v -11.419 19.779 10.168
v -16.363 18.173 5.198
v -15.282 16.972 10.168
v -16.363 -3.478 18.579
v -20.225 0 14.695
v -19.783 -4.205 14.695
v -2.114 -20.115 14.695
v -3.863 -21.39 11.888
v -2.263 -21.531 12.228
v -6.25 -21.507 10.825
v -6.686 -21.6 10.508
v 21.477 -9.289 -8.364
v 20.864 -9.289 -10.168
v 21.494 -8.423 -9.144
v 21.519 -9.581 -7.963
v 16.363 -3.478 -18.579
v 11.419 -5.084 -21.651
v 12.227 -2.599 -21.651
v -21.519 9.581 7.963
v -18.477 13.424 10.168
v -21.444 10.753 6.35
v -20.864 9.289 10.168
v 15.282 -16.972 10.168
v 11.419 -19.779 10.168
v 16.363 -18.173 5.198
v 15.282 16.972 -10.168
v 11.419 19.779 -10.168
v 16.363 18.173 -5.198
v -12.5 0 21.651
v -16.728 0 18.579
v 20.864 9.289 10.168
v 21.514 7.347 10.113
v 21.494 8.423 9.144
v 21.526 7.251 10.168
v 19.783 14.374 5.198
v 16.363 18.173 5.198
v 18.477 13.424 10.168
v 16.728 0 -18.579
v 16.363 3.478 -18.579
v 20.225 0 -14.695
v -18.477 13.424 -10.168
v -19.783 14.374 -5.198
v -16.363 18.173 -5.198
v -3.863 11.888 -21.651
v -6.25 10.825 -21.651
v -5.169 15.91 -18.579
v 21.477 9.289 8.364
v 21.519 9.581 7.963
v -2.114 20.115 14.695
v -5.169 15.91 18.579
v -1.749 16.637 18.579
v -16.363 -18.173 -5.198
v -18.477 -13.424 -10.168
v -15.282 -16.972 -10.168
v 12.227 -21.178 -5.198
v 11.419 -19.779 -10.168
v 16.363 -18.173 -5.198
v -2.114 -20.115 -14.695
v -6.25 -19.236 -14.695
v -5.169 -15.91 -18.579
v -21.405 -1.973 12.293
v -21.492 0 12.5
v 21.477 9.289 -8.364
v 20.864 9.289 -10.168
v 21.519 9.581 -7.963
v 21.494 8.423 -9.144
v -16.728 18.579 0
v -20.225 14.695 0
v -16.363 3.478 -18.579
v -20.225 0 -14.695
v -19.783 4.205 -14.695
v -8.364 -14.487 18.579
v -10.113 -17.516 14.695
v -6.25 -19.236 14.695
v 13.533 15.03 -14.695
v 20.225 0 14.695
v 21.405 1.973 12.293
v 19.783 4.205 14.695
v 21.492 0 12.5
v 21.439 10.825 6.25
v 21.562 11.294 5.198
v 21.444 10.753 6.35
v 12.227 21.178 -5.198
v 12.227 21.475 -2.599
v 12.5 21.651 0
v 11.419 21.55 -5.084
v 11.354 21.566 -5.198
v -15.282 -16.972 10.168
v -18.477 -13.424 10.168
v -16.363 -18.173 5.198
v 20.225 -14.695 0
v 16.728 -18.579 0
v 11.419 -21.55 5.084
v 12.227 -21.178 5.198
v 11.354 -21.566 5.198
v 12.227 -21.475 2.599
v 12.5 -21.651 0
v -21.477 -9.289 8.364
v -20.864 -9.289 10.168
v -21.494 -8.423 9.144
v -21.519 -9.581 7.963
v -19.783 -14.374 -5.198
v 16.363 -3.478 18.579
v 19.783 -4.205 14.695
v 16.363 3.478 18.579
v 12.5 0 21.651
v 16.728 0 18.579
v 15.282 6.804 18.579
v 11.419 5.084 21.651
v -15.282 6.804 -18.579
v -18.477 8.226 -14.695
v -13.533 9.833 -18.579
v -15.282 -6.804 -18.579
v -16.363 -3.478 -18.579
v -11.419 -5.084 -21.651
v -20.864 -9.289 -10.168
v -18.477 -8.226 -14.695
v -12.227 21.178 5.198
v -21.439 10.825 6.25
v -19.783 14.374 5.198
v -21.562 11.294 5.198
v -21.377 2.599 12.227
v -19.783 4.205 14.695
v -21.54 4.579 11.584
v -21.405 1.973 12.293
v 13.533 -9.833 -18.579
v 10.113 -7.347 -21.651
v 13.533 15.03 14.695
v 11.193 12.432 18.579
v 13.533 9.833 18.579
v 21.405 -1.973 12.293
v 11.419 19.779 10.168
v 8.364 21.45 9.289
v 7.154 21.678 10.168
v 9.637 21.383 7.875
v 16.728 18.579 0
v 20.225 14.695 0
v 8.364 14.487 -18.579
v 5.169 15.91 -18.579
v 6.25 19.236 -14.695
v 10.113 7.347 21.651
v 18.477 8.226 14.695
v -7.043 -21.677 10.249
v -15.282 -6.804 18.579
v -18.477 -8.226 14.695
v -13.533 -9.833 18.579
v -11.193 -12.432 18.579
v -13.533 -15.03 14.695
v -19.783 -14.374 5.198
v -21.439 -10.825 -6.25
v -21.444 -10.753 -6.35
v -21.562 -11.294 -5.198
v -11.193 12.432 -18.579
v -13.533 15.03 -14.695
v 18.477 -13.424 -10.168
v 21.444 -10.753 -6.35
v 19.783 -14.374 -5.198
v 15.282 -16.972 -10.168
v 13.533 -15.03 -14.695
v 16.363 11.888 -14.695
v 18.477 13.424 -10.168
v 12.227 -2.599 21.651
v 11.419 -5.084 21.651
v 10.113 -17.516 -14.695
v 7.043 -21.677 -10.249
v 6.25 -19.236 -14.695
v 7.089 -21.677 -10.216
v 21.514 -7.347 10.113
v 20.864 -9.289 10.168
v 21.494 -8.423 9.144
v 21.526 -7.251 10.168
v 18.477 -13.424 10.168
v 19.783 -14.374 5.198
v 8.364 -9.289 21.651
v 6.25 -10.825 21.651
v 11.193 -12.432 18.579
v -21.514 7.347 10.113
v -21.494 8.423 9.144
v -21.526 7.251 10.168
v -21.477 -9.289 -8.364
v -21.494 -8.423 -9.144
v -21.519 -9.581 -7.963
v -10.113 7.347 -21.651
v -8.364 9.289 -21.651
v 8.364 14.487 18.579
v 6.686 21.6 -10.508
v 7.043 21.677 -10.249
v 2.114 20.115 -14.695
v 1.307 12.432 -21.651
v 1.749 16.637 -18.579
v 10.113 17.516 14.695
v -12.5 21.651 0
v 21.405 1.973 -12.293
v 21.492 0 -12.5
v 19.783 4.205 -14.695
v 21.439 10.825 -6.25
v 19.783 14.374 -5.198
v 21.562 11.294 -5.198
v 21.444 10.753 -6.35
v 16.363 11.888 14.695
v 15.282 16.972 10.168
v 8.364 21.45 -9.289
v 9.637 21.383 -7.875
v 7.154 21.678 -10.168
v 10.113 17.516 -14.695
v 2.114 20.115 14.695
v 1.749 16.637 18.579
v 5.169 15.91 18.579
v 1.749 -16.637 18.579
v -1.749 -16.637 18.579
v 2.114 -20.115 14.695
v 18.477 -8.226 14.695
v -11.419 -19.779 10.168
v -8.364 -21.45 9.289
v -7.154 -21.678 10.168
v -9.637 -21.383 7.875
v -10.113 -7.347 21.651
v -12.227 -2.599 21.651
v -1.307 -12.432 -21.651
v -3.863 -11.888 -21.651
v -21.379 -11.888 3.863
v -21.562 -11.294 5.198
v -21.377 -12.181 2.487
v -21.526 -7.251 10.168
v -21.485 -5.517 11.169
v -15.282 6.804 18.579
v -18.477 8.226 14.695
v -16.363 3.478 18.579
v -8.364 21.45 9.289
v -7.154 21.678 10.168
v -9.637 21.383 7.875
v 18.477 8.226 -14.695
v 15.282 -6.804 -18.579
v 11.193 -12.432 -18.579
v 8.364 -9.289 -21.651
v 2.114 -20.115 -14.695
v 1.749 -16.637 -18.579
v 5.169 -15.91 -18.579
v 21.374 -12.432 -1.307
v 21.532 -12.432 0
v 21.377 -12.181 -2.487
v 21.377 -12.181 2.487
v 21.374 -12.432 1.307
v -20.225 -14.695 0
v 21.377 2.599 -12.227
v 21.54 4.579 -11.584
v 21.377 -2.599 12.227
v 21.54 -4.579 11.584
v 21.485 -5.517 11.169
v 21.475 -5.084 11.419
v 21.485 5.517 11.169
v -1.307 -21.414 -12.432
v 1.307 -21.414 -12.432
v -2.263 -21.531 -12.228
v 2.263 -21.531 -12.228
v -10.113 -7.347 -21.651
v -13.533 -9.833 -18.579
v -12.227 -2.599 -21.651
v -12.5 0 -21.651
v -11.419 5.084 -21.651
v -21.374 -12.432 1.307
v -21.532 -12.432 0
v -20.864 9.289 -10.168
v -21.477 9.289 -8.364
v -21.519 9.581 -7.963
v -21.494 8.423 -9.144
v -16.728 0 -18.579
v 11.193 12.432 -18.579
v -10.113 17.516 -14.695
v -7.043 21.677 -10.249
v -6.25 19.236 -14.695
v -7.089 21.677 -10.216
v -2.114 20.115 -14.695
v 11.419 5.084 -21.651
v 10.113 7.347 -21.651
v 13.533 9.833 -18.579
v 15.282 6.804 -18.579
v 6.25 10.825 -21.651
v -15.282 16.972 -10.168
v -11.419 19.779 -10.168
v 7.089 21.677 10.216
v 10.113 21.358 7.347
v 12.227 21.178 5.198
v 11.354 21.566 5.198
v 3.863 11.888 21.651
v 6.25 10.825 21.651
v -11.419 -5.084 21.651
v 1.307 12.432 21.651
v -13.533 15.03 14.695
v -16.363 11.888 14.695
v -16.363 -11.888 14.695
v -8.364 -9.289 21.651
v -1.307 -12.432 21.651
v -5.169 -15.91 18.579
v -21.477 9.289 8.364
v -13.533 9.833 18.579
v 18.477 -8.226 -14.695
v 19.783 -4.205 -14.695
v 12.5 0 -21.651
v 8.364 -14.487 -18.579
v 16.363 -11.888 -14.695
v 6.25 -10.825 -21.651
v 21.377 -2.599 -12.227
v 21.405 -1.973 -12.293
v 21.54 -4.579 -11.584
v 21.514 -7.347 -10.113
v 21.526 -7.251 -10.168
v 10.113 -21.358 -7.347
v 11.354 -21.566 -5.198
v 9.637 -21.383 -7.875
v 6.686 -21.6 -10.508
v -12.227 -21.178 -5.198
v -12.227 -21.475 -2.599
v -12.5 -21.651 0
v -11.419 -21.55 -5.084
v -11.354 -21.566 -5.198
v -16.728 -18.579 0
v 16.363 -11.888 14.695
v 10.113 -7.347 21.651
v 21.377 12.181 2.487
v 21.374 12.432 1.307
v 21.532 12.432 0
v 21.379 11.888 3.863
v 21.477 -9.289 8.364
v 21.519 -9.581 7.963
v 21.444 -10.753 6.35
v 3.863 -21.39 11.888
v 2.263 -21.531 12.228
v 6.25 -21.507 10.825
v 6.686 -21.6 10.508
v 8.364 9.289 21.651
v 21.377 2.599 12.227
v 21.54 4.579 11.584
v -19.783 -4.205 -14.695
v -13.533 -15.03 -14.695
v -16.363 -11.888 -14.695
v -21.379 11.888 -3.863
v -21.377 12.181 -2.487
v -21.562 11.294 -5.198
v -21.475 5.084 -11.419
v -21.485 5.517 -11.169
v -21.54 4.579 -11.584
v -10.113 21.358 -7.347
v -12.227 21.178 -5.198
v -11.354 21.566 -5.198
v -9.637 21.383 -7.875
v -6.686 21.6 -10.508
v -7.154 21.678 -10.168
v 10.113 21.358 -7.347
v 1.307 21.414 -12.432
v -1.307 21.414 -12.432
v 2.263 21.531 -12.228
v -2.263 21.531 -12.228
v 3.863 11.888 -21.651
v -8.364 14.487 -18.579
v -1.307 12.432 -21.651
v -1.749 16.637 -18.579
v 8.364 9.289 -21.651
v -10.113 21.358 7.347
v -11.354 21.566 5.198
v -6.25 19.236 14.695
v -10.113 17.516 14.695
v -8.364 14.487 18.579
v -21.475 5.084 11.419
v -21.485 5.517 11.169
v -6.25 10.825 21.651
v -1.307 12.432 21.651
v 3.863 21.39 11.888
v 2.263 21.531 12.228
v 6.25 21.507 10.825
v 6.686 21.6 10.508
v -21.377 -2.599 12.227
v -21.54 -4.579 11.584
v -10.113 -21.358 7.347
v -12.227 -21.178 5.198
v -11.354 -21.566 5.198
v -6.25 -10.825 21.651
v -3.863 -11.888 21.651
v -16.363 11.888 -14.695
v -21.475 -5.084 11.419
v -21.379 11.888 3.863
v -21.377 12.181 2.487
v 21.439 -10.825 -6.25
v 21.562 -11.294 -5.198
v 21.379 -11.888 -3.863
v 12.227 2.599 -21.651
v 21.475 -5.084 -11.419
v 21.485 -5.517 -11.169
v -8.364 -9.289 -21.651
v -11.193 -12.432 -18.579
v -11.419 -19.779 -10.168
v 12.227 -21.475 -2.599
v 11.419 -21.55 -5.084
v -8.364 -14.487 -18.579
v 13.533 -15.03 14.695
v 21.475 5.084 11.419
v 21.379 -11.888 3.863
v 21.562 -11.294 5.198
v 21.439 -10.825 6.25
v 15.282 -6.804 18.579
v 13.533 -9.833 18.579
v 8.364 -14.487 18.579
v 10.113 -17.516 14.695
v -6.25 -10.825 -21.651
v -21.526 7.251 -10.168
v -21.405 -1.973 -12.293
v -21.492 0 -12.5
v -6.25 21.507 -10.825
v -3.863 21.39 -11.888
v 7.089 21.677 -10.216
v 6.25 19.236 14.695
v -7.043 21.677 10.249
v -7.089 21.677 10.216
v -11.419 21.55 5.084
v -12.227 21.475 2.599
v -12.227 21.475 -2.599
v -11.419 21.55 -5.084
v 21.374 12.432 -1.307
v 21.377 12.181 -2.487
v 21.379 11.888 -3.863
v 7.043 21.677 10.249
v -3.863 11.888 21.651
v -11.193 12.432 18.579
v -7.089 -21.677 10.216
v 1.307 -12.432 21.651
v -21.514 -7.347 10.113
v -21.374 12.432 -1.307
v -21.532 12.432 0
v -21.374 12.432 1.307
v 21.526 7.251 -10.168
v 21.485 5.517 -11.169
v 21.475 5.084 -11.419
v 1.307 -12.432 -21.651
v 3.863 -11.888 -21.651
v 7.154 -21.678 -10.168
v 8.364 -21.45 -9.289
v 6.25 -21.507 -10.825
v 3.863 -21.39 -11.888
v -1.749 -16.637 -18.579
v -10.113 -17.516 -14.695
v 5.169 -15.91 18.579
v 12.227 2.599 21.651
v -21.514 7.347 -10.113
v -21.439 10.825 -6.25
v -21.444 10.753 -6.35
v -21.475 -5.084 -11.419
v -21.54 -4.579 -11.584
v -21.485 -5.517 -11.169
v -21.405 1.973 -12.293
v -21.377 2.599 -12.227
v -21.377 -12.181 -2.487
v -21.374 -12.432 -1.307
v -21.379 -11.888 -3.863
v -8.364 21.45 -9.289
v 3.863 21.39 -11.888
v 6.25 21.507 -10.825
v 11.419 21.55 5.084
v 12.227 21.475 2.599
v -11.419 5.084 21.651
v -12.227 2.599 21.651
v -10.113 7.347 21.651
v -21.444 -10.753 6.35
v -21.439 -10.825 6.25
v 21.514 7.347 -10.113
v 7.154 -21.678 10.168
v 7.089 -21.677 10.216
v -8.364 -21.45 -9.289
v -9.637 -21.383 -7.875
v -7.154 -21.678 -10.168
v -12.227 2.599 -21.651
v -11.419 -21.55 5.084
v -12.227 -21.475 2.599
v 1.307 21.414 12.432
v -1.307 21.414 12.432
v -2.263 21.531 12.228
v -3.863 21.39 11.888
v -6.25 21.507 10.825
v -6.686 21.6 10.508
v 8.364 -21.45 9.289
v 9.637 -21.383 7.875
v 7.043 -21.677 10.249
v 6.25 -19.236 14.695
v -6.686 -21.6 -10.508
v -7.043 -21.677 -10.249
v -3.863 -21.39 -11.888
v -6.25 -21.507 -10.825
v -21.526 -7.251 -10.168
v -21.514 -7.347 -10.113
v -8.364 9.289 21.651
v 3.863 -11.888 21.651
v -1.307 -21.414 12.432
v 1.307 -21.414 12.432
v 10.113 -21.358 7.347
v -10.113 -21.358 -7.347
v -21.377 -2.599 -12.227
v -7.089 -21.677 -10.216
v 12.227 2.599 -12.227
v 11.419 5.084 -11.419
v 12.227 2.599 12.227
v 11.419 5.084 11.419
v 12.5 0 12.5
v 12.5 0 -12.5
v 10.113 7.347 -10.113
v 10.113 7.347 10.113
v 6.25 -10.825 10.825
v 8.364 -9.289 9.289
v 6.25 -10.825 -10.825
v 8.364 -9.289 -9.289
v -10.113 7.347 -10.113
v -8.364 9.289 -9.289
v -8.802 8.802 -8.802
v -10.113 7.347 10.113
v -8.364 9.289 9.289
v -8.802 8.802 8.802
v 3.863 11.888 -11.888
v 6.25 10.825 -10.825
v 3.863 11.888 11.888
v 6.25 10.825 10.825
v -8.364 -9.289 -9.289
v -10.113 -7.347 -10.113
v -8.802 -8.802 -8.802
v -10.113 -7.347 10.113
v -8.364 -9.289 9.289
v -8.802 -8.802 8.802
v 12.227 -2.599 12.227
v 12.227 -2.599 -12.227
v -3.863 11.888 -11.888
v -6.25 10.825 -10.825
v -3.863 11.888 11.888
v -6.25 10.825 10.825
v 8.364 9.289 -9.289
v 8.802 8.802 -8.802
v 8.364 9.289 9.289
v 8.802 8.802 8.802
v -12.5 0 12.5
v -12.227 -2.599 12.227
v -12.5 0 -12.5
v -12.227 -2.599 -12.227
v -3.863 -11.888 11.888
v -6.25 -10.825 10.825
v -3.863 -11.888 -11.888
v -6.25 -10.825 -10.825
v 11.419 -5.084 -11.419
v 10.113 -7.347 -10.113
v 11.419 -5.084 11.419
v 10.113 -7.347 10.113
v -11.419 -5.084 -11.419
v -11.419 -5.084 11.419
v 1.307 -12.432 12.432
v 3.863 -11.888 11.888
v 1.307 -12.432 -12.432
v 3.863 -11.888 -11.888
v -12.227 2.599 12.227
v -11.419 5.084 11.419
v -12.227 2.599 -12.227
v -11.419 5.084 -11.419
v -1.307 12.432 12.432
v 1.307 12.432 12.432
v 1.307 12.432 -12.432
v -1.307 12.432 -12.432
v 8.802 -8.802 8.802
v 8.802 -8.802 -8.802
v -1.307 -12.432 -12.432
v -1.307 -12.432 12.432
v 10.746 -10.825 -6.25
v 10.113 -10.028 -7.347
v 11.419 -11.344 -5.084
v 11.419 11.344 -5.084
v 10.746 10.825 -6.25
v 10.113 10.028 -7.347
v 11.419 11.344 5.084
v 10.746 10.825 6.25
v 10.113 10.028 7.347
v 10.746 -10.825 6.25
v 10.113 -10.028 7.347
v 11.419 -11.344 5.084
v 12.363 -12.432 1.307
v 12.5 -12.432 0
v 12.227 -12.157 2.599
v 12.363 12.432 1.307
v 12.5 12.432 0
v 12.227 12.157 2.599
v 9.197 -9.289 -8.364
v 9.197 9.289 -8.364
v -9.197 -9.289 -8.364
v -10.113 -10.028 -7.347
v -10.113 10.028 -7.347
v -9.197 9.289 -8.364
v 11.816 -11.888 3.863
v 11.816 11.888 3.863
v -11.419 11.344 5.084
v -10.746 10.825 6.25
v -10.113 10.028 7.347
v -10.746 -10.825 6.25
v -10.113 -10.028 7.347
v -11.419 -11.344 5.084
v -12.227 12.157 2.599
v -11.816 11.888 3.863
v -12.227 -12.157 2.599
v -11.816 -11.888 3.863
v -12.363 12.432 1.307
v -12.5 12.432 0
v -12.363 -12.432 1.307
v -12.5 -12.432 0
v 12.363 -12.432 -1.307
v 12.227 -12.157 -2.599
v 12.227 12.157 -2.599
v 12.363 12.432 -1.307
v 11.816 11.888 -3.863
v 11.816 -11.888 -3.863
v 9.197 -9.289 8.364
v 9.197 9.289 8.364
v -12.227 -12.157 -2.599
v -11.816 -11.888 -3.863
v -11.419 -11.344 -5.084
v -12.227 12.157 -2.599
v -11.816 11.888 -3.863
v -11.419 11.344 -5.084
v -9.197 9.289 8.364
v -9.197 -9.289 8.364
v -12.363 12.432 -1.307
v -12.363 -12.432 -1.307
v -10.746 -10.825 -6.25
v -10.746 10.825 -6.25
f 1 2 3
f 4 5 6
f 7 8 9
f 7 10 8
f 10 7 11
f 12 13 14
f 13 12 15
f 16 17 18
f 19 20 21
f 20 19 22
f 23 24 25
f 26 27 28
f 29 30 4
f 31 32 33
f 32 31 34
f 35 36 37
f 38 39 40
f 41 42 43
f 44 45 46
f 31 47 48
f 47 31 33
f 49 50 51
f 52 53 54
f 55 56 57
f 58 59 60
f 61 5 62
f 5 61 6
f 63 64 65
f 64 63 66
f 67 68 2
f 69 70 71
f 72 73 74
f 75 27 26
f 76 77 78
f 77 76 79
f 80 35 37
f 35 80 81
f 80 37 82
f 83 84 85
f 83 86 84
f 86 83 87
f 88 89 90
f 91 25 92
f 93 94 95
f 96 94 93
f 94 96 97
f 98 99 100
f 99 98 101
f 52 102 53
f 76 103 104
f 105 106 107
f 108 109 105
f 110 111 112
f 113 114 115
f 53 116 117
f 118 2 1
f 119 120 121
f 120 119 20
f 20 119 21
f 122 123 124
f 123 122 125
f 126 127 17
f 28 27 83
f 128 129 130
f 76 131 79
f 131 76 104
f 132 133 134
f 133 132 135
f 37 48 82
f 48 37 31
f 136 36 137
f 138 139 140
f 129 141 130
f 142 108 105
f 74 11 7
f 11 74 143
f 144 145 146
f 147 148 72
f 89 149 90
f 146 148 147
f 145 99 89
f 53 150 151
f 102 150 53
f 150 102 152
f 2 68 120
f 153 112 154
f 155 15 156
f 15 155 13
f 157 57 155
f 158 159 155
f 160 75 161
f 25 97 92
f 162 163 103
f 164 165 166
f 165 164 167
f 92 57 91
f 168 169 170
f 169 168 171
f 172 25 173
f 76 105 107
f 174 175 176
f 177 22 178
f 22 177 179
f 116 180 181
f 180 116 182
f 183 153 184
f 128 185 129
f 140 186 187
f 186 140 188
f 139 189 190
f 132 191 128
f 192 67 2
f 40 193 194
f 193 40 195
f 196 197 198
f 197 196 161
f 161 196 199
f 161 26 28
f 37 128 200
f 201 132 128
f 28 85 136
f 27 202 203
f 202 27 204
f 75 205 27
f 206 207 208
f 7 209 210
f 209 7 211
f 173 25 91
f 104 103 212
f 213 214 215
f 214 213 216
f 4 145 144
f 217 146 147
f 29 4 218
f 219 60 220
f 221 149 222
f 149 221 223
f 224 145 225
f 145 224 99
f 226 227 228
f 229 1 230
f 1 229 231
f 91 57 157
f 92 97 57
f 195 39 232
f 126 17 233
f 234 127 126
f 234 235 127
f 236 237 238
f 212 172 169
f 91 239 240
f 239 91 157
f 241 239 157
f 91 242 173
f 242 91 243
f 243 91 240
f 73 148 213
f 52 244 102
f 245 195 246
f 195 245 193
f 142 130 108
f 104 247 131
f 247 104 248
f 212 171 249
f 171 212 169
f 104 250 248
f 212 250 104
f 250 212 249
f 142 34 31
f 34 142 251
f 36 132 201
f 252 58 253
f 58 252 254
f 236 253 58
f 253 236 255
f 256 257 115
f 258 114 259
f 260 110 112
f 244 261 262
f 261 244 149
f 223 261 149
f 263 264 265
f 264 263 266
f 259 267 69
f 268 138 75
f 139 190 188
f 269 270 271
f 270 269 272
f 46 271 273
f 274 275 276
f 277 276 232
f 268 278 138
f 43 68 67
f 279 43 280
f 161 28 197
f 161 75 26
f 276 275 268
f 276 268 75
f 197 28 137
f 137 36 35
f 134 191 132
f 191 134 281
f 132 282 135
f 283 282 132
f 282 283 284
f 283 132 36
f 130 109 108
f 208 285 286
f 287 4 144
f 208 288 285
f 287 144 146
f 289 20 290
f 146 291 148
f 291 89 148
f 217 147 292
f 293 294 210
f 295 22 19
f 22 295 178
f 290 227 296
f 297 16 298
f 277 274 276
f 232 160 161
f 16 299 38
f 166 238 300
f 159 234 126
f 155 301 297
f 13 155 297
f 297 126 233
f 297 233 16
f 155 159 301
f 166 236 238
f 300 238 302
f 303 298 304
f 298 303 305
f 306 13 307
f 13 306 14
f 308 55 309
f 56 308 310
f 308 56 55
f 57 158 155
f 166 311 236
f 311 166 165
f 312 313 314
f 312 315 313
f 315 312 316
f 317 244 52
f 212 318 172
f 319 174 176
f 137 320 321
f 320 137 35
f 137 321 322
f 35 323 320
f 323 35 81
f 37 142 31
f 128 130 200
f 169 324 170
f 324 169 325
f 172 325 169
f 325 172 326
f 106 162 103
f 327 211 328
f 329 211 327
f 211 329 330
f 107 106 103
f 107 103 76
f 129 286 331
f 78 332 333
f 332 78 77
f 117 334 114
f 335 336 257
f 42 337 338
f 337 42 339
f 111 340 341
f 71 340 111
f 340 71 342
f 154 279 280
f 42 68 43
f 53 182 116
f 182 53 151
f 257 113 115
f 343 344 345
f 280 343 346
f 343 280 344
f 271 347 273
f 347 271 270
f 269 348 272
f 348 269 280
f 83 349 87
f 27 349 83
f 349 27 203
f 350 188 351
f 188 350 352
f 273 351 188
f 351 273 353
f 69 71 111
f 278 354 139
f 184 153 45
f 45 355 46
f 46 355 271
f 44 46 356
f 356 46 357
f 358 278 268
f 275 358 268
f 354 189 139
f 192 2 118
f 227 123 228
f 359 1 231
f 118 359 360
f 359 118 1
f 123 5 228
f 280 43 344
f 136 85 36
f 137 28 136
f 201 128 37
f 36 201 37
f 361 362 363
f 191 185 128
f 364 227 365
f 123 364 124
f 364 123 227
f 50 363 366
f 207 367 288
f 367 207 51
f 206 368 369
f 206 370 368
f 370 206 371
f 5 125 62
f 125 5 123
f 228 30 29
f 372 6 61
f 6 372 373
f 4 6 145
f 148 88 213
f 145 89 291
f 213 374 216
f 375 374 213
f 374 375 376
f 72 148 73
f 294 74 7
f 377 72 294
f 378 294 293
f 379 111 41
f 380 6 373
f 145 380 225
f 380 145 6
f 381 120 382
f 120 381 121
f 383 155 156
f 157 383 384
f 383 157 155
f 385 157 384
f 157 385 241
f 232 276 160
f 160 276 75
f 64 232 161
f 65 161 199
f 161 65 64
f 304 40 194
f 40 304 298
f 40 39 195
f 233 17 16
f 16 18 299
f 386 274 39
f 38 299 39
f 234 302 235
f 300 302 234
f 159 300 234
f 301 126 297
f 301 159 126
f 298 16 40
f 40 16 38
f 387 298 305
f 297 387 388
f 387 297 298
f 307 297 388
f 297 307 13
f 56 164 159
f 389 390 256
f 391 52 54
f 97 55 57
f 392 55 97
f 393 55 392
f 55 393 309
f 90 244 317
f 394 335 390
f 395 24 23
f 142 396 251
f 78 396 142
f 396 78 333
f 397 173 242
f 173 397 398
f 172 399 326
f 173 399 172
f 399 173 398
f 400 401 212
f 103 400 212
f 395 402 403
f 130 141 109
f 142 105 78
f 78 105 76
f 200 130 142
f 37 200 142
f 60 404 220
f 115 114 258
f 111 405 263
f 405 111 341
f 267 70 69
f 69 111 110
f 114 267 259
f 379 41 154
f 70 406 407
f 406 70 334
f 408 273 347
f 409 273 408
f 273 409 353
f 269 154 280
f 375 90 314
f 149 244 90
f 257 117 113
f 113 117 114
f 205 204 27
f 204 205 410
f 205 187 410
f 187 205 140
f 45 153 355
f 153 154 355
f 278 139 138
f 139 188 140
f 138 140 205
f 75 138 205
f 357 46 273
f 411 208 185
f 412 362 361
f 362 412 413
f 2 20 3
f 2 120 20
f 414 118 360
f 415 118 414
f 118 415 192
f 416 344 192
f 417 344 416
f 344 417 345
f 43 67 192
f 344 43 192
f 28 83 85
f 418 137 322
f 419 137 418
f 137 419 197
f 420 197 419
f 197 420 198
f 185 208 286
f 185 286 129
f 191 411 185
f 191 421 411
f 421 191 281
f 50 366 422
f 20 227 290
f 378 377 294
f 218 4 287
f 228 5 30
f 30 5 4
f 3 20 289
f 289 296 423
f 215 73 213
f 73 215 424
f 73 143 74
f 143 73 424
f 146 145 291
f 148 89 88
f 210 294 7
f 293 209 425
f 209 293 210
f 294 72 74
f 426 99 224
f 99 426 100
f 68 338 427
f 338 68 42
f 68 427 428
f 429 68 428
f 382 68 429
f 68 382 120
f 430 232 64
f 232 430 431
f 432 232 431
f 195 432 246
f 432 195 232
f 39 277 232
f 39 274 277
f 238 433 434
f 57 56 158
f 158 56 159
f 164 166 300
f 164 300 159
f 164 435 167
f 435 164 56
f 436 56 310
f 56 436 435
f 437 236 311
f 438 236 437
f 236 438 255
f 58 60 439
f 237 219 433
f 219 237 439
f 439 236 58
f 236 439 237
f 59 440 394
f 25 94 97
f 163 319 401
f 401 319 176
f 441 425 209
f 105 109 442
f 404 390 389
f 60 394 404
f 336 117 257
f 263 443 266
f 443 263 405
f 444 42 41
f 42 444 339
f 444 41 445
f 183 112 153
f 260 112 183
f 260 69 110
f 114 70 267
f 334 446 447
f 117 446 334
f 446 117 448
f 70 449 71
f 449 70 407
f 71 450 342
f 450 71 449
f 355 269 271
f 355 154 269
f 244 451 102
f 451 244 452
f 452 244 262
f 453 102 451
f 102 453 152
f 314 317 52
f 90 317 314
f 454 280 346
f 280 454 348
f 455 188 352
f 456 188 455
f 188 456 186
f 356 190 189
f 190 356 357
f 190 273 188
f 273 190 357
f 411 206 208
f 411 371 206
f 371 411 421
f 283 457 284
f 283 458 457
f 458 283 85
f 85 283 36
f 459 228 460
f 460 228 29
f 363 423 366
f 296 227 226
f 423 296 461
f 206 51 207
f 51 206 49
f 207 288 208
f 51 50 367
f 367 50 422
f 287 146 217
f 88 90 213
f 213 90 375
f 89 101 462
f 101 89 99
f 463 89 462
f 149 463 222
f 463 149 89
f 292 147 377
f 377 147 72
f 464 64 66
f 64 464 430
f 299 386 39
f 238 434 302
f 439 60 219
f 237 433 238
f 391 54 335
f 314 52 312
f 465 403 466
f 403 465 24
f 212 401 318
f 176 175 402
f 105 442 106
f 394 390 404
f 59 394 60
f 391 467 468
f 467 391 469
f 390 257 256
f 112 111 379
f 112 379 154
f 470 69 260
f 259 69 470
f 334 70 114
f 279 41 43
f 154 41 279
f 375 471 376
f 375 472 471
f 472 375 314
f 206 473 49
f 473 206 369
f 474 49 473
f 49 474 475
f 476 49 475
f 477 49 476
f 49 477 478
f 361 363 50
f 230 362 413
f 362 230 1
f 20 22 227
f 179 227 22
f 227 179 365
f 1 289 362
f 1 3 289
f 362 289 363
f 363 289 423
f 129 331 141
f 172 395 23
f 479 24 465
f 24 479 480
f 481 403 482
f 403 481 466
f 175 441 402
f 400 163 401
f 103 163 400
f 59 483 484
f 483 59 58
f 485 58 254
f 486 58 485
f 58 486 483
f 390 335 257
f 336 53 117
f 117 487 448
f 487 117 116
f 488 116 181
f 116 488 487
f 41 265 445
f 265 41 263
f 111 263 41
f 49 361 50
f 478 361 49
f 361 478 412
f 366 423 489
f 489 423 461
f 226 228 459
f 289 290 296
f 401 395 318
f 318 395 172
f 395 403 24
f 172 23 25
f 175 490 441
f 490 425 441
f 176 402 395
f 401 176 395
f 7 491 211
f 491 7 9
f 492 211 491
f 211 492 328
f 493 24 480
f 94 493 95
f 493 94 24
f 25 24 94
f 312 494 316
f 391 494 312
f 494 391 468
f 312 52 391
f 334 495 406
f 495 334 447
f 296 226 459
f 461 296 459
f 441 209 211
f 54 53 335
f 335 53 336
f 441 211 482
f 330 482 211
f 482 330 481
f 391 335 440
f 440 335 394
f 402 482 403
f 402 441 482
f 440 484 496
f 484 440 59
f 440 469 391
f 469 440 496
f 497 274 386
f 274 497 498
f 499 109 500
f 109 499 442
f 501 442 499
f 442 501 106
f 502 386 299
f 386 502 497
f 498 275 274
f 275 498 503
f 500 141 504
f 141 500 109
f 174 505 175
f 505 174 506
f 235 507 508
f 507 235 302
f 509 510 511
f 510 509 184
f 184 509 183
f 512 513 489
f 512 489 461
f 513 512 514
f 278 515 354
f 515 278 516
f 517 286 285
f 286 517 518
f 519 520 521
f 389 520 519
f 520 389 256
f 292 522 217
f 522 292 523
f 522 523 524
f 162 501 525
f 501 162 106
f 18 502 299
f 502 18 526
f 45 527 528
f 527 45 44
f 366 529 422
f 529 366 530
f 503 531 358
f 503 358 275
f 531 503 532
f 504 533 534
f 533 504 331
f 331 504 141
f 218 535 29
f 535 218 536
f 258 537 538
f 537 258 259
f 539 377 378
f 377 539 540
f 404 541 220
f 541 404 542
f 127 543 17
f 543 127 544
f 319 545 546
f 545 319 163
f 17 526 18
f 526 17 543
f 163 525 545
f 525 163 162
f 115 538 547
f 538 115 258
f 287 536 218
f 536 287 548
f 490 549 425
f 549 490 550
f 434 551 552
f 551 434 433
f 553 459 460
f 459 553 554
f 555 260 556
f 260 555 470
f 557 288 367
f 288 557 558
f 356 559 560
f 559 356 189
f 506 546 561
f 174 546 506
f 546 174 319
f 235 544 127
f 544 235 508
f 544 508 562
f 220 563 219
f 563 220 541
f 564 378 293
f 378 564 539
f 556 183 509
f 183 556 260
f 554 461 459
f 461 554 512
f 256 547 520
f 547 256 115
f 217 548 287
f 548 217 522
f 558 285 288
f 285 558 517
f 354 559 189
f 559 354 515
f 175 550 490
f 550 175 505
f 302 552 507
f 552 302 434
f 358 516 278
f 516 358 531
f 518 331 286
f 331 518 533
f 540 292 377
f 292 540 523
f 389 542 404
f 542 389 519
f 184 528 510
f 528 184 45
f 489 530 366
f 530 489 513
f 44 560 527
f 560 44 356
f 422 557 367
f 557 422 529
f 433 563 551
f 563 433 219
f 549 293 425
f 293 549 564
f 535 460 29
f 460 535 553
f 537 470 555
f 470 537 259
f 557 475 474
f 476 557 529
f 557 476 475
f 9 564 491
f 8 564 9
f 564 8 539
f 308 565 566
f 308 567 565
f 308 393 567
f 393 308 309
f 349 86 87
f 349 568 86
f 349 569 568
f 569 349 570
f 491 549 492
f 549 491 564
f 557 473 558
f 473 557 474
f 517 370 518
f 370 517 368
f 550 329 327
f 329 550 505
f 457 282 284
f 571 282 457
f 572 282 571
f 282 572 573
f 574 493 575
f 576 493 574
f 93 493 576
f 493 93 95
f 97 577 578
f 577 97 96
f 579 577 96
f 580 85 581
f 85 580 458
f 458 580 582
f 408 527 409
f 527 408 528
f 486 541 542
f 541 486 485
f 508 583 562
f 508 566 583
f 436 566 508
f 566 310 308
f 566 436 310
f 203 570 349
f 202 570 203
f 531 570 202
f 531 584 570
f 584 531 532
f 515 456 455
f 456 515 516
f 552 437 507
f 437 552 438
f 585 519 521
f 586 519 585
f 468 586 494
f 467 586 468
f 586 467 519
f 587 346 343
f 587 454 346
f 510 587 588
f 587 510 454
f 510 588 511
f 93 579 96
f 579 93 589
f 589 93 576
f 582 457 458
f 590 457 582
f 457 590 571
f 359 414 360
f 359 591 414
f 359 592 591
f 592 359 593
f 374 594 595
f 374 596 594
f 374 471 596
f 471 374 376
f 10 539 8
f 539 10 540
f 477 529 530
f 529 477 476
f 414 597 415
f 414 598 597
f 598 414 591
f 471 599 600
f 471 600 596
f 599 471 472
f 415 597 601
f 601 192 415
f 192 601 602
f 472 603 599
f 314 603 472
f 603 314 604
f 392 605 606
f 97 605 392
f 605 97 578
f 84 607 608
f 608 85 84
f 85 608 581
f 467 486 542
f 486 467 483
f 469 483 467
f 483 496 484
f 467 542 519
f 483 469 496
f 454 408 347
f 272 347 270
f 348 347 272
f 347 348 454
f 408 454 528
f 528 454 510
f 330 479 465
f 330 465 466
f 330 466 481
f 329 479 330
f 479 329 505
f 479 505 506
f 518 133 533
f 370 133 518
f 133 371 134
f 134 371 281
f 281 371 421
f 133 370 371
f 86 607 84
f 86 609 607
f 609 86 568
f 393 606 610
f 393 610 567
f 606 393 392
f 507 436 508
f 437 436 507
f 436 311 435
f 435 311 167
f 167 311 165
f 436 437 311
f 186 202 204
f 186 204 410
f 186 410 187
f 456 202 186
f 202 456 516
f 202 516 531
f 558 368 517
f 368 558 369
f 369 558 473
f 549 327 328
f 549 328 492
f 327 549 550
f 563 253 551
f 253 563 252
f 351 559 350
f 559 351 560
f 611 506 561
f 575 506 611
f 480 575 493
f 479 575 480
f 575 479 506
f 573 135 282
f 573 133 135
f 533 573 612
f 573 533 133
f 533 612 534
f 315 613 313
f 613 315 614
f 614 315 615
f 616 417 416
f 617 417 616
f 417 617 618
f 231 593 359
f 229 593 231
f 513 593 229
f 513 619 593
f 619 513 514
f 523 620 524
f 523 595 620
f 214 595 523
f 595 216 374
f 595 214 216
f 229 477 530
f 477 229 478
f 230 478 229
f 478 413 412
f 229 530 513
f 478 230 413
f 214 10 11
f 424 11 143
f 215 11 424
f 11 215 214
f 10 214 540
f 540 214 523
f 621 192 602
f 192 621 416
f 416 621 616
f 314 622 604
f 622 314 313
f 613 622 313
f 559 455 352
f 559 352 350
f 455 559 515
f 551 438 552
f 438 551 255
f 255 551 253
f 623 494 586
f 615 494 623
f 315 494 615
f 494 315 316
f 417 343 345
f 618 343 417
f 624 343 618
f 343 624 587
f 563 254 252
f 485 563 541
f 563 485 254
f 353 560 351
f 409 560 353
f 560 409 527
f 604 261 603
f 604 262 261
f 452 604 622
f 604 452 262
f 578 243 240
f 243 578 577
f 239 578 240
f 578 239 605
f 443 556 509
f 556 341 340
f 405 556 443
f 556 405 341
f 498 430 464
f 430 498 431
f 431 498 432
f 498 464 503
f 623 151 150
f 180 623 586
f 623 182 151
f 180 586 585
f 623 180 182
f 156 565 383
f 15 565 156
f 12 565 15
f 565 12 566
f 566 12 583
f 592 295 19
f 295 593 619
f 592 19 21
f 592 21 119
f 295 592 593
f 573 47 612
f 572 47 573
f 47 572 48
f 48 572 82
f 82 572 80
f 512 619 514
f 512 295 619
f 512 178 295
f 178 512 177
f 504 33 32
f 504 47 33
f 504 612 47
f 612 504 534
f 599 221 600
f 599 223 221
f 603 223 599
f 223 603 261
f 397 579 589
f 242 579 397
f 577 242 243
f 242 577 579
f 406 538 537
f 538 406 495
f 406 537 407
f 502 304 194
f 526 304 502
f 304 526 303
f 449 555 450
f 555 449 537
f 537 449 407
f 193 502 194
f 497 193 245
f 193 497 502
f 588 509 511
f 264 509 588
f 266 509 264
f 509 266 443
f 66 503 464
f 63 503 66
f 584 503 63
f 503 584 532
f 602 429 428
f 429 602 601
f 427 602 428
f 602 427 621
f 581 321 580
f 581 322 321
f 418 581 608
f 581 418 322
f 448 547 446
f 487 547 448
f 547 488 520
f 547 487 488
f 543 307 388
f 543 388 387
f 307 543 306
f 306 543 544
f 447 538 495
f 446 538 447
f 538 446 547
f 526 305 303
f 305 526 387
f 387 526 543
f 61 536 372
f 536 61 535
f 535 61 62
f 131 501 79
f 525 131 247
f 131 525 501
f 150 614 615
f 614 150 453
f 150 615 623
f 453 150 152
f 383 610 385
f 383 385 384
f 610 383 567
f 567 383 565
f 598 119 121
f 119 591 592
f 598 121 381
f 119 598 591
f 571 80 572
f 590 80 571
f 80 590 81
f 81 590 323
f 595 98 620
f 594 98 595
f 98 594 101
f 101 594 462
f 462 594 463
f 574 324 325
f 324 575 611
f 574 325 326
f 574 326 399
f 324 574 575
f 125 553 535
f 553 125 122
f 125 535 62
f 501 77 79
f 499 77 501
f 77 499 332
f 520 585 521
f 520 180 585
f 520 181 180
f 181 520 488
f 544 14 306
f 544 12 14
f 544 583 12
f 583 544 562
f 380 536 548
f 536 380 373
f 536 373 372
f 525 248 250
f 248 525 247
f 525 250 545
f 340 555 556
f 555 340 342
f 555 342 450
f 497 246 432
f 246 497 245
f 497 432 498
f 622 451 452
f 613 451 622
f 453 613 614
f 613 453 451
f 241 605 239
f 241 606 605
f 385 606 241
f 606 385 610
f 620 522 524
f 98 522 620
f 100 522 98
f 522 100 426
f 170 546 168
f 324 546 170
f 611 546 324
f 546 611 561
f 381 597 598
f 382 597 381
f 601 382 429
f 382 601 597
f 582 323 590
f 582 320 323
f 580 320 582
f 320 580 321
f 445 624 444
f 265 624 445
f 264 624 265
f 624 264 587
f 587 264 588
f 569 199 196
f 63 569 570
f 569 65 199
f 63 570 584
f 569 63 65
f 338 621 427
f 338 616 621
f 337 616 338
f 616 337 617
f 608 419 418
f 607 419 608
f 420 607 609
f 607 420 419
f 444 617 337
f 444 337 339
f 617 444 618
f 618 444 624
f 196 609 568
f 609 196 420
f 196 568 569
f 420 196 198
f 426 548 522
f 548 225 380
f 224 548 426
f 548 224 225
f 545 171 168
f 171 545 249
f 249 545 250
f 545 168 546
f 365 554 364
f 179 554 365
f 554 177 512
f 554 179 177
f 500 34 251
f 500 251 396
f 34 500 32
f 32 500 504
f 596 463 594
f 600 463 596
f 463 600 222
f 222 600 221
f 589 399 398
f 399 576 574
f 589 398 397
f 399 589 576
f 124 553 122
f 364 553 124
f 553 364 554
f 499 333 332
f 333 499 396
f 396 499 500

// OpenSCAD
// [FL_INDEX: keywords="openscad, 3d_parametric, testy, csg_solid" | COT="Parametric OpenSCAD design from 3DCodeverse"]
// Title: testy

module example001()
{
	function r_from_dia(d) = d / 2;

	module rotcy(rot, r, h) {
		rotate(90, rot)
			cylinder(r = r, h = h, center = true);
	}

	difference() {
		sphere(r = r_from_dia(size));
		rotcy([0, 0, 0], cy_r, cy_h);
		rotcy([1, 0, 0], cy_r, cy_h);
		rotcy([0, 1, 0], cy_r, cy_h);
	}

	size = 50;
	hole = 25;

	cy_r = r_from_dia(hole);
	cy_h = r_from_dia(size * 2.5);
}

example001();
